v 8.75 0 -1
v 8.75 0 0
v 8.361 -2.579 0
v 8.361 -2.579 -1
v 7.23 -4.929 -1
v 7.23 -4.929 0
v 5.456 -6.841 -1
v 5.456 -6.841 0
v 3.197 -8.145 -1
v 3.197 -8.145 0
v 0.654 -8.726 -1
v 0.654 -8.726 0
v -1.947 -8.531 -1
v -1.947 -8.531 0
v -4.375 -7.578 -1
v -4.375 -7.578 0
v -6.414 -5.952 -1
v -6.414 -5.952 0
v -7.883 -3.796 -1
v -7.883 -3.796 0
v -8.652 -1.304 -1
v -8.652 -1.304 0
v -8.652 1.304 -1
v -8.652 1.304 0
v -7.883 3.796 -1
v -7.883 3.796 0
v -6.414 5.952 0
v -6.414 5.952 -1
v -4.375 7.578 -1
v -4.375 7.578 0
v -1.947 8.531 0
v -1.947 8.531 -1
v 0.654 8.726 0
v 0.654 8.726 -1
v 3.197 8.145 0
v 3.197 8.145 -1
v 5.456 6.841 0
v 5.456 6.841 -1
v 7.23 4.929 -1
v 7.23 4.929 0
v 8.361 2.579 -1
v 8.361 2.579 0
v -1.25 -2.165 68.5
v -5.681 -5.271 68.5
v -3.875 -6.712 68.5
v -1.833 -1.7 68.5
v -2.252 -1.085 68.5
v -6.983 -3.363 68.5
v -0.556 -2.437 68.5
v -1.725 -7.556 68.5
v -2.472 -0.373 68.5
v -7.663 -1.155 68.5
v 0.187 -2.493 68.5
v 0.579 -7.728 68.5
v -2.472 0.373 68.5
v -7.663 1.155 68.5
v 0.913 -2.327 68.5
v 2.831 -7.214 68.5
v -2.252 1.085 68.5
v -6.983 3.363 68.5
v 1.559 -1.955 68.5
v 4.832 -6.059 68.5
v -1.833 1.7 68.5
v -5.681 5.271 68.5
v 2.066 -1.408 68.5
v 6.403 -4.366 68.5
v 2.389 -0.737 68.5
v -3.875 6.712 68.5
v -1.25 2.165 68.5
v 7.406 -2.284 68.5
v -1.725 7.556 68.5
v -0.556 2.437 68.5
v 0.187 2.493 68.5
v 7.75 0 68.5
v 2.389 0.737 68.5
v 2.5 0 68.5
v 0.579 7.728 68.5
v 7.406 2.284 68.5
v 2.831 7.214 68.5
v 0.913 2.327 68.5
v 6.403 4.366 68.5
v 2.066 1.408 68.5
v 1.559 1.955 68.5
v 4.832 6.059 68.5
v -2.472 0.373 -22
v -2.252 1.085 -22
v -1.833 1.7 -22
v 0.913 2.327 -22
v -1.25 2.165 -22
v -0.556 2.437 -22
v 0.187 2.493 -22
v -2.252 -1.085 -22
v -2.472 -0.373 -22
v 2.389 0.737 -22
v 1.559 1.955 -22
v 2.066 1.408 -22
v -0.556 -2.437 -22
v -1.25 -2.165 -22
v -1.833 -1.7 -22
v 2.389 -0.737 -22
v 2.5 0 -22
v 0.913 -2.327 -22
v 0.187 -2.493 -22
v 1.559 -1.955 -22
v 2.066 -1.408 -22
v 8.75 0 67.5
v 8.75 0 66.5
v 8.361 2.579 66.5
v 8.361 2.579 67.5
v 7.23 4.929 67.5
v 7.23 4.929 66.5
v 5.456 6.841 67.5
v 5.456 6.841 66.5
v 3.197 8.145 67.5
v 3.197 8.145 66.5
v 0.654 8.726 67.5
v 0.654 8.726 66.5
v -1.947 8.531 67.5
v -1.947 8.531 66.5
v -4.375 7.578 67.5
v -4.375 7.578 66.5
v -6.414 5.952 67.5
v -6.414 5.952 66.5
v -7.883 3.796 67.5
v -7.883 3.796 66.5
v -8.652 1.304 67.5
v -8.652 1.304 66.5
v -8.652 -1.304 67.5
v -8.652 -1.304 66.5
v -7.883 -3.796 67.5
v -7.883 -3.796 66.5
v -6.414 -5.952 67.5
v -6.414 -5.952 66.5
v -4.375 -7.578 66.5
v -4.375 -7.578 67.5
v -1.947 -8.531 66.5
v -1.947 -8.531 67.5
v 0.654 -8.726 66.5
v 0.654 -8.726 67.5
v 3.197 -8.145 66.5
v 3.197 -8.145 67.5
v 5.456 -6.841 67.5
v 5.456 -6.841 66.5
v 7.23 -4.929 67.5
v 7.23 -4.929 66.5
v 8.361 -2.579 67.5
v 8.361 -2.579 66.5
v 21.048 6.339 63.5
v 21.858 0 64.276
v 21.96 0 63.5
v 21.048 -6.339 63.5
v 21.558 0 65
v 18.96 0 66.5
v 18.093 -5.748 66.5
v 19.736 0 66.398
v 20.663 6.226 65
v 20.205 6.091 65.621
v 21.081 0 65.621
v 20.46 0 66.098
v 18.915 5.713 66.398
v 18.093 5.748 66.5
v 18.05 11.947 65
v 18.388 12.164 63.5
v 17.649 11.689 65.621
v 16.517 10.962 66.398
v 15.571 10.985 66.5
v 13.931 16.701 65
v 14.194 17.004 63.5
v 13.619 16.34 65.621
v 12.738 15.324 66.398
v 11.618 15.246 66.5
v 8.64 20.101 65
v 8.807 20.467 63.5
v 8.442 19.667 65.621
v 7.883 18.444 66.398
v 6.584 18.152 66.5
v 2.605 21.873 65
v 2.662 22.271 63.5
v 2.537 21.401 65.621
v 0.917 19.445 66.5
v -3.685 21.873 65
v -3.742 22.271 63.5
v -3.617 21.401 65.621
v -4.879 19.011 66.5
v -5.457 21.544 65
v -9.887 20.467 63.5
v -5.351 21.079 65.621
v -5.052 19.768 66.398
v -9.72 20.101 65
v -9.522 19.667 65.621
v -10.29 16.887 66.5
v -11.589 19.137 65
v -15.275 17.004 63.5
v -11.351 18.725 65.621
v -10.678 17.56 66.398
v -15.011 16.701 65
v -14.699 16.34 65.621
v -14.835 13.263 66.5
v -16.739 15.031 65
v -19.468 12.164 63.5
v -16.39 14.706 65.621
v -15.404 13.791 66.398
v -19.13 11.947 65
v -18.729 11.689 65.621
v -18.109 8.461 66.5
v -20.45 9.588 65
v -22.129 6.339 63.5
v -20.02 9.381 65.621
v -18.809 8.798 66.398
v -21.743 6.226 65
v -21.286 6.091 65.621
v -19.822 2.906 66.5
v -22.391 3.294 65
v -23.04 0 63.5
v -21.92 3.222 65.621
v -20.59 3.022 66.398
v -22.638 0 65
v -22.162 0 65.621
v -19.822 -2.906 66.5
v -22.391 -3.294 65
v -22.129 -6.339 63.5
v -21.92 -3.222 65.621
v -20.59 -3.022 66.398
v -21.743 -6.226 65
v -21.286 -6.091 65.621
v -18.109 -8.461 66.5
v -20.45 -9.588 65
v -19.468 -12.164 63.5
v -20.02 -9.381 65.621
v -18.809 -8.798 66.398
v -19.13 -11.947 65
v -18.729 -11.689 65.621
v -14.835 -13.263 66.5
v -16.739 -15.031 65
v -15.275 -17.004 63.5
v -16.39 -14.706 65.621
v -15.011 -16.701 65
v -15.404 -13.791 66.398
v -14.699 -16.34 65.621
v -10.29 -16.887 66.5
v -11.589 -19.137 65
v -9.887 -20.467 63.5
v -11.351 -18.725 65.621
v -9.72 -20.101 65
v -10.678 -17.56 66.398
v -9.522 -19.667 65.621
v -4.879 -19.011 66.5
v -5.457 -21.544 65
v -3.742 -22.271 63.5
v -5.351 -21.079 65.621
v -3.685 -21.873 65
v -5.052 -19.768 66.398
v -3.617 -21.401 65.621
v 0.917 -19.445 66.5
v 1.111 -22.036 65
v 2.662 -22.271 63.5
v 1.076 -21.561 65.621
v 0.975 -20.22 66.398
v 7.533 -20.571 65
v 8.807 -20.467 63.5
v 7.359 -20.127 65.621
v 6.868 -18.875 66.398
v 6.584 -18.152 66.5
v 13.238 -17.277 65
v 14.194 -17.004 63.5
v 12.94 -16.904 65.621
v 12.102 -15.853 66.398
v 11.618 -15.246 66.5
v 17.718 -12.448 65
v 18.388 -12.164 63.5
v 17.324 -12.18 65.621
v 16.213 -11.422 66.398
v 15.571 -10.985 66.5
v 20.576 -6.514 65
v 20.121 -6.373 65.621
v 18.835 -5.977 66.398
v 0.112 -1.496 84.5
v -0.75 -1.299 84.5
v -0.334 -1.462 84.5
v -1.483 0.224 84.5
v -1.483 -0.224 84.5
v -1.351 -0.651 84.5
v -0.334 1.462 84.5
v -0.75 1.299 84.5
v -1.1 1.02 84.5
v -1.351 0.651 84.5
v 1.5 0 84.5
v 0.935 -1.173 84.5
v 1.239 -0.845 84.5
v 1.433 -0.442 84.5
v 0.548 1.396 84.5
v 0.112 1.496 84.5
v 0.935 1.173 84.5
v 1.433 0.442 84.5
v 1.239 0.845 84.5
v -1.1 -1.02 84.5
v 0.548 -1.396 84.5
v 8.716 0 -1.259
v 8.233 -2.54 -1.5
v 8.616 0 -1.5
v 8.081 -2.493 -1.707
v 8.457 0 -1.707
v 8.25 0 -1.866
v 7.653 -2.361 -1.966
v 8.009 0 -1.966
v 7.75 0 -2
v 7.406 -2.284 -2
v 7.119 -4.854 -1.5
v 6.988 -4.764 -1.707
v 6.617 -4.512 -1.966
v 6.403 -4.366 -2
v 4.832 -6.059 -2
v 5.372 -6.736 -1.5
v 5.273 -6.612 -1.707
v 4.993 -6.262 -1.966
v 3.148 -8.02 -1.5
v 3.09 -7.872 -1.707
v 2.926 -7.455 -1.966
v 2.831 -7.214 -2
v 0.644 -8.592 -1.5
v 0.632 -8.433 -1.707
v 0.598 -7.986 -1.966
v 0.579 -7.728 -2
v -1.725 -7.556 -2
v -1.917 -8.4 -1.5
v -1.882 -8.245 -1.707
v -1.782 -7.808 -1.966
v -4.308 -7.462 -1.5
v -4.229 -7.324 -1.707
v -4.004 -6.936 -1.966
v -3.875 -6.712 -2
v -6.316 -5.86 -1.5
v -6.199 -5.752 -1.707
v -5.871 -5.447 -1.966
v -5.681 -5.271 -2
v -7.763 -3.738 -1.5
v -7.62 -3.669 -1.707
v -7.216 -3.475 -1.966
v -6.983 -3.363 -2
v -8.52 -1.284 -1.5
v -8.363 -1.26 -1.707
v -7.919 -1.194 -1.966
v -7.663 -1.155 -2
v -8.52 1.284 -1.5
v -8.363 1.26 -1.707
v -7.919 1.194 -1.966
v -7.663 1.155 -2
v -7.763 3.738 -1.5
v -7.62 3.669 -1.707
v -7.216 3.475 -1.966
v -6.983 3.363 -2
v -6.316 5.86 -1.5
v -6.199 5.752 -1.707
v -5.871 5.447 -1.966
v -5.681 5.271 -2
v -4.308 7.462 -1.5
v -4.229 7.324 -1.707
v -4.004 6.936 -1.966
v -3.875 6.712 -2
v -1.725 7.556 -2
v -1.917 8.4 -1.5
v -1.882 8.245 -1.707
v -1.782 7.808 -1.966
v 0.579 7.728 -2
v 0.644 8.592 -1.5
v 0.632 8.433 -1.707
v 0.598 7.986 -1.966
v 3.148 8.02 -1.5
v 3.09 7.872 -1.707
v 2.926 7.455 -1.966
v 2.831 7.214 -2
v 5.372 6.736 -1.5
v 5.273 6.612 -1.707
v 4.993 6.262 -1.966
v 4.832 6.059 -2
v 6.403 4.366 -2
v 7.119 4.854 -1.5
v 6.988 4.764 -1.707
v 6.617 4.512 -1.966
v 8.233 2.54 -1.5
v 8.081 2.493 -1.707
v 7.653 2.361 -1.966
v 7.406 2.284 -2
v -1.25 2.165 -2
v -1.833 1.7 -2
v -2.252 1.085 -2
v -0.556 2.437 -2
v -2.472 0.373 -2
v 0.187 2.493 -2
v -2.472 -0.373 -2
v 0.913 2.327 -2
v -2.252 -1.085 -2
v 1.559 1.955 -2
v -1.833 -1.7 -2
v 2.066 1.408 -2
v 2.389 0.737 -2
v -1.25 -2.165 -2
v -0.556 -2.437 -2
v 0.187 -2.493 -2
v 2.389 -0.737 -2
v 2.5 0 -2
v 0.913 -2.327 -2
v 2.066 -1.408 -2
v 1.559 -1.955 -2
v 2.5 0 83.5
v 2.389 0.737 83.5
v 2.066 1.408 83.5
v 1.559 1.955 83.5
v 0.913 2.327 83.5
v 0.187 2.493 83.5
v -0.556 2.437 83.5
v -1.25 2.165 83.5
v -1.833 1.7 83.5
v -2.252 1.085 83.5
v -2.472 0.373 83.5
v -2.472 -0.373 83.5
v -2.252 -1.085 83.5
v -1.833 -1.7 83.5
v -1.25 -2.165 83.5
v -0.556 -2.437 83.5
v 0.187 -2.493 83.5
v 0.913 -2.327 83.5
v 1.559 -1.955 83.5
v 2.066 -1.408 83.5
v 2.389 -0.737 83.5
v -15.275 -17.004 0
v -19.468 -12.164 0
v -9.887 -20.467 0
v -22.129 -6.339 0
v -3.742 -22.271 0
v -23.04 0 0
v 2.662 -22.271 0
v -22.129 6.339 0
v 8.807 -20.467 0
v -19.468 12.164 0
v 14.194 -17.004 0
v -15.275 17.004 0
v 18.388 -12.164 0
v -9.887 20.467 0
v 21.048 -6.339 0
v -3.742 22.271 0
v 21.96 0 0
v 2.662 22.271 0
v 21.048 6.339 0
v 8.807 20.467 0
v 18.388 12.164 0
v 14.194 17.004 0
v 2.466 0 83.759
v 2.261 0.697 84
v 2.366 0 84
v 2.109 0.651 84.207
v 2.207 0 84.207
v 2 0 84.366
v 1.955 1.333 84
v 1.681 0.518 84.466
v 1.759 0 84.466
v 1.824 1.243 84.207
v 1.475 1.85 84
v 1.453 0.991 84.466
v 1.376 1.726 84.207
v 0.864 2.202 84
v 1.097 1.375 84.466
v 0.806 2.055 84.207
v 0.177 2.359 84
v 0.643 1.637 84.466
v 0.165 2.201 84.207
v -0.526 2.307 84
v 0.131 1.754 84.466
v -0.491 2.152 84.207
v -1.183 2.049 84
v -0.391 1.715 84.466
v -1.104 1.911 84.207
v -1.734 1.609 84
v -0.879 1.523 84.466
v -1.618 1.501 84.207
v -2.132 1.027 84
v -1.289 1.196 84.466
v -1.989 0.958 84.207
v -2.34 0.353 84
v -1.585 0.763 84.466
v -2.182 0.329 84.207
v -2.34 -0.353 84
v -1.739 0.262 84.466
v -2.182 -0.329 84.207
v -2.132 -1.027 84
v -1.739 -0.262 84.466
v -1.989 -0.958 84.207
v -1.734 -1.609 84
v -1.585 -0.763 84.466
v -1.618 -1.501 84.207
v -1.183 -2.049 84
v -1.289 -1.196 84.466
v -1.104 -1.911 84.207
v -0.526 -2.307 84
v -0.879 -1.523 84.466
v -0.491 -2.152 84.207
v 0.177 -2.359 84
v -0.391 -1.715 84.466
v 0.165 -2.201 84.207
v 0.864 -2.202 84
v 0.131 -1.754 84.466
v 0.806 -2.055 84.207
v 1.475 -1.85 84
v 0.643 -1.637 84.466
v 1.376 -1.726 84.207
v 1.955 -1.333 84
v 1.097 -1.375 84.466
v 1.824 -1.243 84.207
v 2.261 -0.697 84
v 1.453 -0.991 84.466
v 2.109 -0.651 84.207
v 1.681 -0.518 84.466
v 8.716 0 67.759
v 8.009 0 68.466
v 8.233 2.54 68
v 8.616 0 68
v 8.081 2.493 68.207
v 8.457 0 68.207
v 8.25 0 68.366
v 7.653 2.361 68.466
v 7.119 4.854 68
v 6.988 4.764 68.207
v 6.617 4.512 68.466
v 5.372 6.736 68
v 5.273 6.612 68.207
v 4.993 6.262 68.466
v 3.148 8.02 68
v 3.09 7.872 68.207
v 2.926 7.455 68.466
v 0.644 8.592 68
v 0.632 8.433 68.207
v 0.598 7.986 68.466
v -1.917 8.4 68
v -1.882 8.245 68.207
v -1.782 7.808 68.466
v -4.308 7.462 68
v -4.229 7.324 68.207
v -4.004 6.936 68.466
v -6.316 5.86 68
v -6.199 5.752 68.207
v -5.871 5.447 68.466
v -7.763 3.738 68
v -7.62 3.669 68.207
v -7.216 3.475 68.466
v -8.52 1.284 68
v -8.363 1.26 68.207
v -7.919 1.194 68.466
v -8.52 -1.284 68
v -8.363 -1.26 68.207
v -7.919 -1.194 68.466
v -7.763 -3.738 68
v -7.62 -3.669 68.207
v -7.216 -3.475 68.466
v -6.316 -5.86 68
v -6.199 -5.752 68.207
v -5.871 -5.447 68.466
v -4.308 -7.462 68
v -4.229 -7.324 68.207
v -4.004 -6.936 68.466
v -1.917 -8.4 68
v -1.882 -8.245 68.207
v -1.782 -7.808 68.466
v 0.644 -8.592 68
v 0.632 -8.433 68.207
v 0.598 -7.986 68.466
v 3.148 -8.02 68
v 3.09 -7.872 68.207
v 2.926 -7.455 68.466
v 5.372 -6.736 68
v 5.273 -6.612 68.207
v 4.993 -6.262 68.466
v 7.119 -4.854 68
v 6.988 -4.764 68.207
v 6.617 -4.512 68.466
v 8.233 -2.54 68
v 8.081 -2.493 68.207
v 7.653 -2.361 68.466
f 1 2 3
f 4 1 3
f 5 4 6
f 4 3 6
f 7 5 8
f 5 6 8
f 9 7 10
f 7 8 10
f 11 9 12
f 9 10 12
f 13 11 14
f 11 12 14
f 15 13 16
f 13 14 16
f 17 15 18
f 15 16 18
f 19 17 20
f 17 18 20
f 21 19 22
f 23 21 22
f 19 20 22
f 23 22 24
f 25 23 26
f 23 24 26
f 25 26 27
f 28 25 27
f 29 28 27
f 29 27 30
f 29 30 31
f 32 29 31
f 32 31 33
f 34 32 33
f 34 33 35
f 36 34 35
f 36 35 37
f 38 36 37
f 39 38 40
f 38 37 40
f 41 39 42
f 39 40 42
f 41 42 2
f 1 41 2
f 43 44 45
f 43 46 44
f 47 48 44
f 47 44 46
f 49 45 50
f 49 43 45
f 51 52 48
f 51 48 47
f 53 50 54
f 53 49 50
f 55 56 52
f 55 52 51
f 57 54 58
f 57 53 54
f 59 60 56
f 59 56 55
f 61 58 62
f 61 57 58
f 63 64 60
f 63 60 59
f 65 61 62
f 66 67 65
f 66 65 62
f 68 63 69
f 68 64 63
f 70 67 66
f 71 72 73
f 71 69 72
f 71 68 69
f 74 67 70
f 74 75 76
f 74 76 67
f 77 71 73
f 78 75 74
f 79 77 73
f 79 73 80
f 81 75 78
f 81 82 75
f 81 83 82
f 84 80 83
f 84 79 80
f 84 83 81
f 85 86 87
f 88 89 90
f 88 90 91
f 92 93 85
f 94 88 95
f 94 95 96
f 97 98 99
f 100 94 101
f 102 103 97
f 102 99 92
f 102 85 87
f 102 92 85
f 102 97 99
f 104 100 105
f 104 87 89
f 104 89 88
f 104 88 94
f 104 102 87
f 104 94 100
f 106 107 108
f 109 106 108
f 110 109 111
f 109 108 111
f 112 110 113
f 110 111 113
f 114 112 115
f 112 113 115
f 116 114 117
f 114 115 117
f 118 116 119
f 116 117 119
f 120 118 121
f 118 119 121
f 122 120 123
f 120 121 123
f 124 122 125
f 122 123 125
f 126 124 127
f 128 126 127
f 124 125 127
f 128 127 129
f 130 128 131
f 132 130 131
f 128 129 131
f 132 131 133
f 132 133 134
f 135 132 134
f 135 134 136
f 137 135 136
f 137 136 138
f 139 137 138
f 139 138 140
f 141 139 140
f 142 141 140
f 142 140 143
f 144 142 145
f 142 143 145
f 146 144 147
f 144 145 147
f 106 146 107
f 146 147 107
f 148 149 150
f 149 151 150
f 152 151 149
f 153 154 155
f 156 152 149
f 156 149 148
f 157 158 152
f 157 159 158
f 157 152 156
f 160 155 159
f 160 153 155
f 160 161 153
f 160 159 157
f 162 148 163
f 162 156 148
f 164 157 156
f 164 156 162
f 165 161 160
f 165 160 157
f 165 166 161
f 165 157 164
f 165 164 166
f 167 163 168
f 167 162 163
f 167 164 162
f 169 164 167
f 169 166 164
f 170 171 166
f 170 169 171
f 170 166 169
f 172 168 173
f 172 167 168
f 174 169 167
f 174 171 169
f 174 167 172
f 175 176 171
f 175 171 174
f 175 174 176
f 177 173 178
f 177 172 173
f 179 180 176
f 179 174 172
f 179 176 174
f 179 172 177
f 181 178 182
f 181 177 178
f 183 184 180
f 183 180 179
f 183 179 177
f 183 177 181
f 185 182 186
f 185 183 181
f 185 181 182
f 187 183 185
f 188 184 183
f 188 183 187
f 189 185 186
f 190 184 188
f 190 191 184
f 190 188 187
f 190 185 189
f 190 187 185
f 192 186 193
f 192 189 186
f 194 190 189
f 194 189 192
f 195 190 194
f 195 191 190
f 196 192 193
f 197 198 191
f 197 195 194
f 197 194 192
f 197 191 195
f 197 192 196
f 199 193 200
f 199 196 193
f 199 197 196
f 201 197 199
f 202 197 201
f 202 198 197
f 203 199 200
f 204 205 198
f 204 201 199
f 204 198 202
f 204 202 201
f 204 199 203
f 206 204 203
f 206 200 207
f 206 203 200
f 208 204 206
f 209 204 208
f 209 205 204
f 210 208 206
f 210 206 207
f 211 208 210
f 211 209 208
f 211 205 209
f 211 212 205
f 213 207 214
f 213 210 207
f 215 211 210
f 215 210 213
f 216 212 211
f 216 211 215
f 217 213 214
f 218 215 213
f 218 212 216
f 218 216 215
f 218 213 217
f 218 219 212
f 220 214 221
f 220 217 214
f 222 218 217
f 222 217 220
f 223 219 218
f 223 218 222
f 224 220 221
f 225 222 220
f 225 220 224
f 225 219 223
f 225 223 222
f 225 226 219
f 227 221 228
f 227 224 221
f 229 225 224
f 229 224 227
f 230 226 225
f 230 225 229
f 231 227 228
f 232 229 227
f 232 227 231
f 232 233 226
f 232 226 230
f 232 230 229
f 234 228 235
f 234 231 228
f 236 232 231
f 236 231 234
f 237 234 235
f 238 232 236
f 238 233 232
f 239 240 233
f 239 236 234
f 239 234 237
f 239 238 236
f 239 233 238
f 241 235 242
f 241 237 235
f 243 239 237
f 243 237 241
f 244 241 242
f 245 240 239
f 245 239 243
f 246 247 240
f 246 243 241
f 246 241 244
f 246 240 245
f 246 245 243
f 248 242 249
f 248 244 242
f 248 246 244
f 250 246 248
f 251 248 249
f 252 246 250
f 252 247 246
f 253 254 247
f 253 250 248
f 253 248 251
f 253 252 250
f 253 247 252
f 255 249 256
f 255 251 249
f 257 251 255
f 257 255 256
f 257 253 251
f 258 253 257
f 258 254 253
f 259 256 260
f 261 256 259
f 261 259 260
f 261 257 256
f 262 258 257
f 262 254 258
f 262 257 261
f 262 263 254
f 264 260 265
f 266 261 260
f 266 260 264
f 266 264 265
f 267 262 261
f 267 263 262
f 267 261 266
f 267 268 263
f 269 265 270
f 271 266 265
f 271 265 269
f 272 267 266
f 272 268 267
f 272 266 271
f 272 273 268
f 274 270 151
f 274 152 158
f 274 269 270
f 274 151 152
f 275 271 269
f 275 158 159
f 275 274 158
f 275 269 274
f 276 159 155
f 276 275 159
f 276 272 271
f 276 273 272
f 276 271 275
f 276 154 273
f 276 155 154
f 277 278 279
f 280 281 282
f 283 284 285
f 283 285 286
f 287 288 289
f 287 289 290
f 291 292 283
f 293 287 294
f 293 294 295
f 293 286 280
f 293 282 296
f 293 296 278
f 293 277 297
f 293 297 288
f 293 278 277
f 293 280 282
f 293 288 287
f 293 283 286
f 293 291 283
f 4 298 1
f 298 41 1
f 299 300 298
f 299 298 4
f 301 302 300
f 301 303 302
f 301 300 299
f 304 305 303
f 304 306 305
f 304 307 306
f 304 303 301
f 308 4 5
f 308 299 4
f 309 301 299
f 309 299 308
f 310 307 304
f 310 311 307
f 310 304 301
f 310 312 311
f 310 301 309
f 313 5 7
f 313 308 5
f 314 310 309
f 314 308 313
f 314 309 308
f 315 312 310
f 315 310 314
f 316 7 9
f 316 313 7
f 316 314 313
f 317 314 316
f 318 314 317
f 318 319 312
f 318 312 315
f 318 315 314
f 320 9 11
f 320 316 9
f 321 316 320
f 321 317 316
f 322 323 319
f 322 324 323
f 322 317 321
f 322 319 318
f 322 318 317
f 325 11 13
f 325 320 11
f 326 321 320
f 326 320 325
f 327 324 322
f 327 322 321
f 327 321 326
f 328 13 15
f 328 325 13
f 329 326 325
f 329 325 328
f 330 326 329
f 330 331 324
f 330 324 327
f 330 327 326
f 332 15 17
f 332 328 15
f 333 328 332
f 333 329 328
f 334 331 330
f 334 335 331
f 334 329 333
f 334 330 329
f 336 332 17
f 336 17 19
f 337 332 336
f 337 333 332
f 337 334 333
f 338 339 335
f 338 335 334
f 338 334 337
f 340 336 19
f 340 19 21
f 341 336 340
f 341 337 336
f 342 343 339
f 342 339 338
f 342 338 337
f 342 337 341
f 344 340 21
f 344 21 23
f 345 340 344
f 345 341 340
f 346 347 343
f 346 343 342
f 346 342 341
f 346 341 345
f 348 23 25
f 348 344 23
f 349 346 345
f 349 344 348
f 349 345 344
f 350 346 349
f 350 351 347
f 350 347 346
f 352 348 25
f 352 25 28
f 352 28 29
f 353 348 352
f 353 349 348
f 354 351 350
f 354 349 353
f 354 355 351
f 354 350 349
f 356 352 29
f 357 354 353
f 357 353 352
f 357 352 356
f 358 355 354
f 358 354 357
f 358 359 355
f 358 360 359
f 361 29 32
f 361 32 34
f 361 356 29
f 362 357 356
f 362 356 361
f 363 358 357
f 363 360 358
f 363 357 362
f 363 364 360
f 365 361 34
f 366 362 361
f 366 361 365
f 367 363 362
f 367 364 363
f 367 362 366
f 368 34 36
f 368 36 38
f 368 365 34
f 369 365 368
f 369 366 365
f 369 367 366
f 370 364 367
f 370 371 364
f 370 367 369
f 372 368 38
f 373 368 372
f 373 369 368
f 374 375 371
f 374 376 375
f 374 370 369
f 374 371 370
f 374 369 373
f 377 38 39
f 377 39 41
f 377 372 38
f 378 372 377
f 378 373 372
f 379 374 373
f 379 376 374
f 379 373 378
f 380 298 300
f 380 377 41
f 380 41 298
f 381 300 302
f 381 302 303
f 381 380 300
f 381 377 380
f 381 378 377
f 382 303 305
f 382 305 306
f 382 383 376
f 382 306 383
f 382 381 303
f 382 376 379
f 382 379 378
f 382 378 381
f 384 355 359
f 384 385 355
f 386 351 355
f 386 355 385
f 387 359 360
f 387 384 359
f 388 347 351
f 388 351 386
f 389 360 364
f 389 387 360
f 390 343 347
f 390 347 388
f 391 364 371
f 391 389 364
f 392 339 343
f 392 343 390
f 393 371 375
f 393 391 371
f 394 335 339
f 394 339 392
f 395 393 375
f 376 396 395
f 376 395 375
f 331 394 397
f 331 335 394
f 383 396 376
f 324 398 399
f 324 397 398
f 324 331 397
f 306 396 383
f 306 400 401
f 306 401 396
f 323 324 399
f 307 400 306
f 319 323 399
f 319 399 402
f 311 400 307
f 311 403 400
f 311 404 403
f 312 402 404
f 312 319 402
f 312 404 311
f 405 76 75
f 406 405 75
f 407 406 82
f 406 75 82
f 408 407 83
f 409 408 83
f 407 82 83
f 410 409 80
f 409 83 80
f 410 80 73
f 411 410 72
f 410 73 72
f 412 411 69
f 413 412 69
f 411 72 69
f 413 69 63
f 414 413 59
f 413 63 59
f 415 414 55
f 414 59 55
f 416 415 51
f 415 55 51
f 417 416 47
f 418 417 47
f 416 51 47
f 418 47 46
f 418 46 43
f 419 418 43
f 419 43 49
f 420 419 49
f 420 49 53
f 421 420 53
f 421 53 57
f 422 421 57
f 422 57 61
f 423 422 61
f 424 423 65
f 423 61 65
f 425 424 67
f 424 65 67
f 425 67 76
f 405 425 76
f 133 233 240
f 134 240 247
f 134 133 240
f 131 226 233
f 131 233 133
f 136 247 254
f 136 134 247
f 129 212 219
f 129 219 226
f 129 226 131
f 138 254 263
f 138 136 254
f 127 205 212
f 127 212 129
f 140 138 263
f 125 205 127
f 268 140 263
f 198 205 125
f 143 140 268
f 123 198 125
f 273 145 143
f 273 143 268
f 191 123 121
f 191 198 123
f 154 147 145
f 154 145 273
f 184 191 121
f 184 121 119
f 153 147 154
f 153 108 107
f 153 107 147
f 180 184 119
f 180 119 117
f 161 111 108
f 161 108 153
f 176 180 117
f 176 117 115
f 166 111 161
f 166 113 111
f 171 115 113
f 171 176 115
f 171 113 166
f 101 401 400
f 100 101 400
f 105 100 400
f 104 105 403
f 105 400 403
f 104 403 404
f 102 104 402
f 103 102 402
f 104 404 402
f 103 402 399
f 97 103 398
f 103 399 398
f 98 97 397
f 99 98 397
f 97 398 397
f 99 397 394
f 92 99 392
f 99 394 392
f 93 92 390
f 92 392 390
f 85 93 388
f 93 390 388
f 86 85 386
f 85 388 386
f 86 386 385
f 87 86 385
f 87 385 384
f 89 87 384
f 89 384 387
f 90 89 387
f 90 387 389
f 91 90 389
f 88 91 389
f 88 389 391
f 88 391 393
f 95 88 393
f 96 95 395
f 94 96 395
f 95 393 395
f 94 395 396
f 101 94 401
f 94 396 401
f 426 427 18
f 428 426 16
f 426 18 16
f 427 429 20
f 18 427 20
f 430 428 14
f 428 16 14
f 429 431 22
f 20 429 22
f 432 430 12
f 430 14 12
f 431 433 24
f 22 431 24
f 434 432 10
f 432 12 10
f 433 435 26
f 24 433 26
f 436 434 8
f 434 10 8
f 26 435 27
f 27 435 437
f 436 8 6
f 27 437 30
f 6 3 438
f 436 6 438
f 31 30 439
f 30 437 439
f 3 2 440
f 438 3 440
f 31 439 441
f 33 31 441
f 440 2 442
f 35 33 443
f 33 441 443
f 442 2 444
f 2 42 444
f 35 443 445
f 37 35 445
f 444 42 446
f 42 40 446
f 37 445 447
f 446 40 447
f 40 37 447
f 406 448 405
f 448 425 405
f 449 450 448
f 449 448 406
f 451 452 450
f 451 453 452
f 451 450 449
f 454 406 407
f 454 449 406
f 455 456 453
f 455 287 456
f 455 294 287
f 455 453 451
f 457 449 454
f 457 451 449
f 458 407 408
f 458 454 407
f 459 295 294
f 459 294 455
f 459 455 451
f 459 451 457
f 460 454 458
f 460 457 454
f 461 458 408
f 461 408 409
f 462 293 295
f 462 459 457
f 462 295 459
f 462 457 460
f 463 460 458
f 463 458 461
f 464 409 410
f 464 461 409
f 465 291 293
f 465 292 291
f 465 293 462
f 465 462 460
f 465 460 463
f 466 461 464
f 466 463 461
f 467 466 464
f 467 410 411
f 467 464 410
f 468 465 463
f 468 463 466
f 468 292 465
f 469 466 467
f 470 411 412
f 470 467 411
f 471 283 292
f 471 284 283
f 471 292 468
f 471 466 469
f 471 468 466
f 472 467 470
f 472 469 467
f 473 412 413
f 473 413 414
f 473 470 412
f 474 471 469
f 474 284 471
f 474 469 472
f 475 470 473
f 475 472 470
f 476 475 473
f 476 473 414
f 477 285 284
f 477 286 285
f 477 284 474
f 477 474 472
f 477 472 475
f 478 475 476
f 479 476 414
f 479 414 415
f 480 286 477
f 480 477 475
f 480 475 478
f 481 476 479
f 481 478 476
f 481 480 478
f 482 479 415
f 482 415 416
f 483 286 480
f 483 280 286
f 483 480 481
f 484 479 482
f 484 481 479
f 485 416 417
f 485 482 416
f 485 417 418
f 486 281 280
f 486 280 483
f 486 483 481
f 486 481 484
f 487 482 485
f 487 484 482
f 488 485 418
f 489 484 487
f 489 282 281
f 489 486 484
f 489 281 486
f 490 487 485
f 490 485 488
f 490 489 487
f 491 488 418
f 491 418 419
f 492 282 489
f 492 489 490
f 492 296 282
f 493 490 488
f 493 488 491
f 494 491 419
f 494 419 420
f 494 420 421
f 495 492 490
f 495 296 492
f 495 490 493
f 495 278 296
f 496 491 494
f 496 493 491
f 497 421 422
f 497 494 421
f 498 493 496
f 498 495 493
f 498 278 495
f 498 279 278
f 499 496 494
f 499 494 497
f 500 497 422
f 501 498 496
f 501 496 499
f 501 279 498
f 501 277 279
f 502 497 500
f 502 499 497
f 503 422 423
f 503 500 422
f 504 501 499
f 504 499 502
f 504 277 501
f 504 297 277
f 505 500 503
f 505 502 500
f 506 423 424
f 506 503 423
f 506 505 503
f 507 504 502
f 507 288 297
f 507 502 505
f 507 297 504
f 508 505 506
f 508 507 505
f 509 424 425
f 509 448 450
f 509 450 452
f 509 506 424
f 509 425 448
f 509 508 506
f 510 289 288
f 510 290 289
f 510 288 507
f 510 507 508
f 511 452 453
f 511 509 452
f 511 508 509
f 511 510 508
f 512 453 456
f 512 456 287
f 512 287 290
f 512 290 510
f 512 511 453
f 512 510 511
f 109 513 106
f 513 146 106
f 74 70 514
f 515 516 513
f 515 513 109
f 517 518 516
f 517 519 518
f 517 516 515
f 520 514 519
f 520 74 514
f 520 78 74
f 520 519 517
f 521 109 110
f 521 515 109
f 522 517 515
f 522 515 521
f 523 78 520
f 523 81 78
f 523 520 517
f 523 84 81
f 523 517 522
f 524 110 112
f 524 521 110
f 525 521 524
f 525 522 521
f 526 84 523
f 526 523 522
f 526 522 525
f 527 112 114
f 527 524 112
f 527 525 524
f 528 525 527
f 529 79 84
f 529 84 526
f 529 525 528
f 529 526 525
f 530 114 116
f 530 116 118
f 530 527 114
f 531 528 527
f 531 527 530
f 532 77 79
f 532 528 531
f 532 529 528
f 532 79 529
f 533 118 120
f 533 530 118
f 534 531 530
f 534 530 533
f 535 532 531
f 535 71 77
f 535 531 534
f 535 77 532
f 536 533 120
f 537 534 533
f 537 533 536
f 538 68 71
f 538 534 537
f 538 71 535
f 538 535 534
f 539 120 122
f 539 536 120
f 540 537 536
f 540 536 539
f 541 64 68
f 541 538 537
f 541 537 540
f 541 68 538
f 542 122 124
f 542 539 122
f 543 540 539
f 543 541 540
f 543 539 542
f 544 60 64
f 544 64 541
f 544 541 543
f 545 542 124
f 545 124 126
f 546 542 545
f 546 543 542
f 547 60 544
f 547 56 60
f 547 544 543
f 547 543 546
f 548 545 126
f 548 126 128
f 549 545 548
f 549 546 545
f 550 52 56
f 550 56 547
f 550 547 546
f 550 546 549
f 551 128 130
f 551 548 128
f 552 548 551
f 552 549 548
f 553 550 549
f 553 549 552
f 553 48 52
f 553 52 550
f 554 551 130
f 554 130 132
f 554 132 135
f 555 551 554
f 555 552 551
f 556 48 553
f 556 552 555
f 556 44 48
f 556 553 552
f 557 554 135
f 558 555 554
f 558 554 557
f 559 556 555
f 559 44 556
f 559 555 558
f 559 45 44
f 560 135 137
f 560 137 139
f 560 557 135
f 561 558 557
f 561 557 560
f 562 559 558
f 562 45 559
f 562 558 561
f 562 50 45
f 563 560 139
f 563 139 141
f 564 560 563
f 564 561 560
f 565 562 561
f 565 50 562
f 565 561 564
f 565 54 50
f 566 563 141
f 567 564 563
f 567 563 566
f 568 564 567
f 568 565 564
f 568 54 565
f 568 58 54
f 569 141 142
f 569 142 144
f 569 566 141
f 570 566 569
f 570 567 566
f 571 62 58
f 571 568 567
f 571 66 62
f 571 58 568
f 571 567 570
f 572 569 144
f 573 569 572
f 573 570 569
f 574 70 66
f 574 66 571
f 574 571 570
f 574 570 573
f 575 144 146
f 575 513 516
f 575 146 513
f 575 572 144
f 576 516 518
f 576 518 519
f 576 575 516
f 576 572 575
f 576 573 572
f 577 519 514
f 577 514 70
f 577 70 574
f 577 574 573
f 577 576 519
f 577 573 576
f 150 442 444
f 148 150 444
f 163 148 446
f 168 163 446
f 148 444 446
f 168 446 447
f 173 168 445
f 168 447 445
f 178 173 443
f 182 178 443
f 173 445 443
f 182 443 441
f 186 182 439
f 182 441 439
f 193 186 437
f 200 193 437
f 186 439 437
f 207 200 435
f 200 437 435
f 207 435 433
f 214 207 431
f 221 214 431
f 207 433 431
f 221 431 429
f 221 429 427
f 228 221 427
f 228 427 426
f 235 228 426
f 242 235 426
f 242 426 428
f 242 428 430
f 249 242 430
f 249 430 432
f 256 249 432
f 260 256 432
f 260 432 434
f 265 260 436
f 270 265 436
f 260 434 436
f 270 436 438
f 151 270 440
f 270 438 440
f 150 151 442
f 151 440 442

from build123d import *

# Parameters (mm, degrees)
SKETCH_R     = 22.5
PAD_DEPTH    = 66.5
FILLET_R     = 3
SKETCH001_R  = 8.75
PAD001_DEPTH = 2
FILLET001_R  = 1
SKETCH002_R  = 2.5
PAD002_DEPTH = 16
FILLET002_R  = 1
SKETCH003_R  = 8.75
PAD003_DEPTH = 2
FILLET003_R  = 1
SKETCH004_R  = 2.5
PAD004_DEPTH = 20


with BuildPart() as part:
    # Sketch → Pad (new body)
    with BuildSketch(Plane.XY):
        with Locations((-0.540205, 0)):
            Circle(SKETCH_R)
    extrude(amount=PAD_DEPTH)

    # Fillet
    fillet_edges = [part.edges().sort_by_distance(p)[0] for p in [
        (-23.040205, 0, 66.5),
    ]]
    fillet(fillet_edges, radius=FILLET_R)

    # Sketch001 (on Face4 of Fillet) → Pad001 (join)
    with BuildSketch(Plane.XY.offset(66.5)):
        Circle(SKETCH001_R)
    extrude(amount=PAD001_DEPTH)

    # Fillet001
    fillet001_edges = [part.edges().sort_by_distance(p)[0] for p in [
        (-8.75, 0, 68.5),
    ]]
    fillet(fillet001_edges, radius=FILLET001_R)

    # Sketch002 (on Face4 of Fillet001) → Pad002 (join)
    with BuildSketch(Plane.XY.offset(68.5)):
        Circle(SKETCH002_R)
    extrude(amount=PAD002_DEPTH)

    # Fillet002
    fillet002_edges = [part.edges().sort_by_distance(p)[0] for p in [
        (-2.5, 0, 84.5),
    ]]
    fillet(fillet002_edges, radius=FILLET002_R)

    # Sketch003 (on Face10 of Fillet002) → Pad003 (join)
    with BuildSketch(Plane(origin=(0, 0, 0), x_dir=(1, 0, 0), z_dir=(0, 0, -1))):
        Circle(SKETCH003_R)
    extrude(amount=PAD003_DEPTH)

    # Fillet003
    fillet003_edges = [part.edges().sort_by_distance(p)[0] for p in [
        (-8.75, 0, -2),
    ]]
    fillet(fillet003_edges, radius=FILLET003_R)

    # Sketch004 (on Face4 of Fillet003) → Pad004 (join)
    with BuildSketch(Plane(origin=(0, 0, -2), x_dir=(1, 0, 0), z_dir=(0, 0, -1))):
        Circle(SKETCH004_R)
    extrude(amount=PAD004_DEPTH)


solid = part.part
